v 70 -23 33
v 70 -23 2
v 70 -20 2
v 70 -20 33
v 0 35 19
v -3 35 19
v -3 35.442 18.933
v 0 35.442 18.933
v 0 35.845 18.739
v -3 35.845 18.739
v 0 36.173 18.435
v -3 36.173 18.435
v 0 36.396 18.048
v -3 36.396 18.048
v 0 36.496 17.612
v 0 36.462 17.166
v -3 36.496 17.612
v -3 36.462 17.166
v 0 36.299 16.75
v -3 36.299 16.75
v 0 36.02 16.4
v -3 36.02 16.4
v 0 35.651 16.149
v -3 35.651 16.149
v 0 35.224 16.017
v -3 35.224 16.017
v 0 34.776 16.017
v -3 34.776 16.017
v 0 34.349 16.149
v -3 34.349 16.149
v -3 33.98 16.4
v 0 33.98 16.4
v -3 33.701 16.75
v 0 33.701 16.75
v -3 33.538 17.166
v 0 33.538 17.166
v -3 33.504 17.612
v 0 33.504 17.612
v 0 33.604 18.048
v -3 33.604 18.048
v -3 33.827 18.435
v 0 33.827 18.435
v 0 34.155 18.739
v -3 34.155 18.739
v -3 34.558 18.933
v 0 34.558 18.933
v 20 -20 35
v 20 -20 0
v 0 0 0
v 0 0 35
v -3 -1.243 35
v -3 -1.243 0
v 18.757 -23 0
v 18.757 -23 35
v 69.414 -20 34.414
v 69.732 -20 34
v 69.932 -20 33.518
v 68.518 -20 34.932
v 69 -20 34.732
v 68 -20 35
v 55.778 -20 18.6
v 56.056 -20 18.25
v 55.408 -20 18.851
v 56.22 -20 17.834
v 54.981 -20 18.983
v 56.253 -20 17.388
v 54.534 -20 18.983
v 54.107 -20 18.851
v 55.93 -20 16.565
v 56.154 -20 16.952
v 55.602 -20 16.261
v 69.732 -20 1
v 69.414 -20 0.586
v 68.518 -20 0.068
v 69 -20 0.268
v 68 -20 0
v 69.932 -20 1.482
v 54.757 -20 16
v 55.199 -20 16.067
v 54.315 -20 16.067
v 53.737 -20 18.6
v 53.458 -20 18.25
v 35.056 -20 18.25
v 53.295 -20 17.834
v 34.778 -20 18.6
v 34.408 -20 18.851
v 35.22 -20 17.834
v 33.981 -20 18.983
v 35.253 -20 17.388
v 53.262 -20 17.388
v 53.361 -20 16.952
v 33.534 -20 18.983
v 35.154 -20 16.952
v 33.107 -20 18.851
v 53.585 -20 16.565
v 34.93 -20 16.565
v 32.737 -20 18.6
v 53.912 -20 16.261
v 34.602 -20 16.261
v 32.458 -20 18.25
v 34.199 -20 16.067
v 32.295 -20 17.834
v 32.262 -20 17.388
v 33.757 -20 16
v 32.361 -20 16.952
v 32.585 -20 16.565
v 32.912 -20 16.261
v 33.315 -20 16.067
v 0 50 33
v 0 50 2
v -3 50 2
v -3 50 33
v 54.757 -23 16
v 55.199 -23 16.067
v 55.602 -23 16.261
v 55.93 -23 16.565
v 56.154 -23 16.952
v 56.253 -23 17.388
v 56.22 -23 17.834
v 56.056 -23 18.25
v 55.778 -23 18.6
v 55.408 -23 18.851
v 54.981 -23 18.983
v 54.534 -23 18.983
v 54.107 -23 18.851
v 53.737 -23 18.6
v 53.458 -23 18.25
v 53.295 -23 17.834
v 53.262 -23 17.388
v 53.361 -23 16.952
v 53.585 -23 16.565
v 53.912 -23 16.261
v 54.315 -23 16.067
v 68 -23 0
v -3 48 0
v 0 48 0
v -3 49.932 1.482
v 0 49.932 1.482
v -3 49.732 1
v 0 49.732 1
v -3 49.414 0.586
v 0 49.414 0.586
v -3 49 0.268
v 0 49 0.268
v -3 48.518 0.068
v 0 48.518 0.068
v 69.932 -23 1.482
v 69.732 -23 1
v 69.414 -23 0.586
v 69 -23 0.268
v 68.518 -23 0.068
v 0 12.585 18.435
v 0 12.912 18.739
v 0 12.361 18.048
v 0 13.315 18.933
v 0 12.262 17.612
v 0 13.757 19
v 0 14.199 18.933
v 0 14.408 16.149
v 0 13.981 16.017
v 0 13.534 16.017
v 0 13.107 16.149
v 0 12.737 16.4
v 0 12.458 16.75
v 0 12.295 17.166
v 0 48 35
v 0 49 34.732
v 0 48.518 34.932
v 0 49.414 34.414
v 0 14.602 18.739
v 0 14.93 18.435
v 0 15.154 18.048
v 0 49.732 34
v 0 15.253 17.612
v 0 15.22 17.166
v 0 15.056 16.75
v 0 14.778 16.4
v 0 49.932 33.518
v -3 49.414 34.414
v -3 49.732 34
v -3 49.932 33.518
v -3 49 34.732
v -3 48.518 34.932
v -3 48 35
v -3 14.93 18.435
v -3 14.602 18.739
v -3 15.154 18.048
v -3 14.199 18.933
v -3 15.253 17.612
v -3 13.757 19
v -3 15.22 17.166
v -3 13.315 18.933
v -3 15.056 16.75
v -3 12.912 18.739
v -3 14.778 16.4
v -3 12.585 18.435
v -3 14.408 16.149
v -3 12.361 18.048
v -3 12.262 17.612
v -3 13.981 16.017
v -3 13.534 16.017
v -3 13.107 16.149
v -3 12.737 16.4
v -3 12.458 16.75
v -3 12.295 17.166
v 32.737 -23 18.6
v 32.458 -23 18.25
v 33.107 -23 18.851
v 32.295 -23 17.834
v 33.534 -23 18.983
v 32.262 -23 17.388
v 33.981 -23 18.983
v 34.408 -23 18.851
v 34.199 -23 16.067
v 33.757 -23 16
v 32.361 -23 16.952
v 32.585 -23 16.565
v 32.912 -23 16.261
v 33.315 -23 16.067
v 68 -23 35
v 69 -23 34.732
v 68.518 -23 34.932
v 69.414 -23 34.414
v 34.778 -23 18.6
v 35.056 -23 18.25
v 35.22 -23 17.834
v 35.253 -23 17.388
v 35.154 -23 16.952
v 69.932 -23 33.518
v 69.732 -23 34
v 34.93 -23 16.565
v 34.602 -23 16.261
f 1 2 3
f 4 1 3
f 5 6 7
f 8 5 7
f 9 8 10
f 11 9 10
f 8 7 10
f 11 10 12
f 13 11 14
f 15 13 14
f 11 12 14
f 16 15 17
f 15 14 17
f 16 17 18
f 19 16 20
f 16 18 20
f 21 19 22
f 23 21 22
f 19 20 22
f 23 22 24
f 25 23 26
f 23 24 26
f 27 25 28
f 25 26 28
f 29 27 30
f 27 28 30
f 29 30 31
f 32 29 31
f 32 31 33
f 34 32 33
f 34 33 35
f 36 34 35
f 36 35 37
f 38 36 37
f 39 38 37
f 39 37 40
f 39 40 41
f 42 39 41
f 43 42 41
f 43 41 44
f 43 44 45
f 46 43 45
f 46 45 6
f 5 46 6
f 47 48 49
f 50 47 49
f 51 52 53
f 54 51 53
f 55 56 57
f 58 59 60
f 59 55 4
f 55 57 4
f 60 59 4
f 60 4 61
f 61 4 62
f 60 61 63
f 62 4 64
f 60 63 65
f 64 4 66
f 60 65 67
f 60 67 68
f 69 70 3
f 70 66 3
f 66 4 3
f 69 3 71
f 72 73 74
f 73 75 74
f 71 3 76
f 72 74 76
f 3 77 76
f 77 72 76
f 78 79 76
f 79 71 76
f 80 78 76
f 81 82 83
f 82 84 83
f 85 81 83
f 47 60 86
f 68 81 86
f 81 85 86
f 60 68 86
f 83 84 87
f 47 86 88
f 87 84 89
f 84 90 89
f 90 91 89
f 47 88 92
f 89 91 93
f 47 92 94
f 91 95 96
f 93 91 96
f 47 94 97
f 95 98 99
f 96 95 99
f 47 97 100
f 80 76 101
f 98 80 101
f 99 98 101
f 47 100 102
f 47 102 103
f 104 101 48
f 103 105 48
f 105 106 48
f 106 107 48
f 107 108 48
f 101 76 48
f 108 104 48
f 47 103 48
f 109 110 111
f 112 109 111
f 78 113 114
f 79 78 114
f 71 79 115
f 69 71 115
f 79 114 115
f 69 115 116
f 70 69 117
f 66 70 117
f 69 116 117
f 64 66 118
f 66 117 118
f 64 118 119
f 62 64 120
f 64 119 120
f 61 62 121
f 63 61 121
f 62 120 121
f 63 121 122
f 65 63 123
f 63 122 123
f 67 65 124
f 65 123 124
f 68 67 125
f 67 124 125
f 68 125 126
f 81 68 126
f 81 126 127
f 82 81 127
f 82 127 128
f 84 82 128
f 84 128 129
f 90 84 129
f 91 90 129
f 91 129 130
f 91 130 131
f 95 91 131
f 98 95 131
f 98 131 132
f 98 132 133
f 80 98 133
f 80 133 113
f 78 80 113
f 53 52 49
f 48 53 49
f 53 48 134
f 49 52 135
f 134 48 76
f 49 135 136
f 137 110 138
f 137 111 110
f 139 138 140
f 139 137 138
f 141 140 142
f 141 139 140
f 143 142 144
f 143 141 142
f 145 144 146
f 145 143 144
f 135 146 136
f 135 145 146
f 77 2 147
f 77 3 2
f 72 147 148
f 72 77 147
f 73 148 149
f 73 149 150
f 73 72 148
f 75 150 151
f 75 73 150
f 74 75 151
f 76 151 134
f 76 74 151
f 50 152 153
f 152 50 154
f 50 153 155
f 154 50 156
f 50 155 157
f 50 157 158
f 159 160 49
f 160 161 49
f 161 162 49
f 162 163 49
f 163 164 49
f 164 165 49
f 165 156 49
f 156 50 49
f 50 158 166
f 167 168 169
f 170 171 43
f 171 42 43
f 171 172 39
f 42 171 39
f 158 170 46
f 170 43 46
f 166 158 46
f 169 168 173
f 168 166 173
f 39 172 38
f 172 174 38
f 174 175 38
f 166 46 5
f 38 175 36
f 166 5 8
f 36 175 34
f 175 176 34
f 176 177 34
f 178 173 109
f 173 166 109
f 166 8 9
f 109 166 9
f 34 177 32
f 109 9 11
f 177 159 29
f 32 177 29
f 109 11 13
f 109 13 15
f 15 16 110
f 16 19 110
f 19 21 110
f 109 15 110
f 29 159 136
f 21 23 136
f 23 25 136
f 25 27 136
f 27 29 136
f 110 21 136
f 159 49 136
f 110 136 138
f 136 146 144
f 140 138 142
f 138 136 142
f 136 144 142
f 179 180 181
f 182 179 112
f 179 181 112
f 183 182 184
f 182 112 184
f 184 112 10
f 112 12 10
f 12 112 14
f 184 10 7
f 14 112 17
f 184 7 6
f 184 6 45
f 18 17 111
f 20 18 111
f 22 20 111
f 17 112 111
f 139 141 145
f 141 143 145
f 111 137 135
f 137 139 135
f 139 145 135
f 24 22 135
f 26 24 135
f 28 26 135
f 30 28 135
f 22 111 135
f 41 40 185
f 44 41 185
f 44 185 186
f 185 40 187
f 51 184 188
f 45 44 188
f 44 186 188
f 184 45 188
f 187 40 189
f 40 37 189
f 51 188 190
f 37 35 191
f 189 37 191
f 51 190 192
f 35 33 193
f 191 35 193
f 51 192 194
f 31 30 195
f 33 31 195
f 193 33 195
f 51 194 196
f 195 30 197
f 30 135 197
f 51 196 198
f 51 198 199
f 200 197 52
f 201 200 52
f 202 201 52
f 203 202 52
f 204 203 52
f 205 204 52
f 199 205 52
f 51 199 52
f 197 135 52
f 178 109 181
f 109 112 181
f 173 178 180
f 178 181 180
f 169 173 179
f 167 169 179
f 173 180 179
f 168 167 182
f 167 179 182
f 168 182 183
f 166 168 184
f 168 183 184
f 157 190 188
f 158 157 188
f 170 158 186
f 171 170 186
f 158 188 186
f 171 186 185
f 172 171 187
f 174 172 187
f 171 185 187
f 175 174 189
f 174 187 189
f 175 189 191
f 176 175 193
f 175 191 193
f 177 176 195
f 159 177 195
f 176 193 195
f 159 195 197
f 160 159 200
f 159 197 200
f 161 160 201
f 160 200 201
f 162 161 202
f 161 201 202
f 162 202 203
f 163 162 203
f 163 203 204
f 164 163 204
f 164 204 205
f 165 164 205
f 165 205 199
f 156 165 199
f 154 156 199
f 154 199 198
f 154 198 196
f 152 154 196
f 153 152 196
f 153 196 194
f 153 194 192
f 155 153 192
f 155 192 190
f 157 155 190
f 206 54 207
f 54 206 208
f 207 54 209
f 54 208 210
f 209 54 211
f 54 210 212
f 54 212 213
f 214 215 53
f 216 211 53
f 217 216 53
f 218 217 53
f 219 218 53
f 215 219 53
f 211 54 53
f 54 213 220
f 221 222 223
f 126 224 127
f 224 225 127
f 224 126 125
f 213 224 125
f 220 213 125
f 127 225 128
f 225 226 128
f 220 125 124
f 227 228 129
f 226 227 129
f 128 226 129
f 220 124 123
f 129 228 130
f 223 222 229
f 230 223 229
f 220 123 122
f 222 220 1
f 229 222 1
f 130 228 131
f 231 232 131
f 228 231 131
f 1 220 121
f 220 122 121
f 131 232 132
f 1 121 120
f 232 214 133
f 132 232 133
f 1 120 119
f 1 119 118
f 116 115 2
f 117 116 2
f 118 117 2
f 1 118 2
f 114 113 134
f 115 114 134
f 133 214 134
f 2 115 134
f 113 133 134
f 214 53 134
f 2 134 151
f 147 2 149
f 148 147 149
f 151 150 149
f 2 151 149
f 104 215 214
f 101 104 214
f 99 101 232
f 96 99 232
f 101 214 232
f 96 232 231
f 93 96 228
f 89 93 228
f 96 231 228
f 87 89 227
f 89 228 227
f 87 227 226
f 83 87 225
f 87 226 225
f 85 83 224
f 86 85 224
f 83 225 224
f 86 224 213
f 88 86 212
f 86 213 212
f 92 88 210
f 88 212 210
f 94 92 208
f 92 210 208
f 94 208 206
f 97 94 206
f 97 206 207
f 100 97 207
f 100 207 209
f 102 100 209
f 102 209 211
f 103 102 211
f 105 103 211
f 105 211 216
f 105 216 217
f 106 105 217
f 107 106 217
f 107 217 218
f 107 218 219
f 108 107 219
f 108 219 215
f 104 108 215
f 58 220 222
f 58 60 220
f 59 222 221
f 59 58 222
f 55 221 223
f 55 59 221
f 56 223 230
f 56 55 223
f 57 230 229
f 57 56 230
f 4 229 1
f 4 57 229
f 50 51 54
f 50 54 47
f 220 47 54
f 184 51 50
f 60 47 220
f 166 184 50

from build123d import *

# Parameters (mm, degrees)
EXTRU_MINCE1_DEPTH      = 35
CONG_3_R                = 2
CONG_4_R                = 2
CONG_5_R                = 2
CONG_6_R                = 2
ESQUISSE2_R             = 1.5
ENL_V_MAT_EXTRU_1_DEPTH = 10
ESQUISSE3_R             = 1.5
ENL_V_MAT_EXTRU_2_DEPTH = 10


with BuildPart() as part:
    # Esquisse1 → Extru.-Mince1 (new body)
    with BuildSketch(Plane.XY):
        Polygon((70, -20), (20, -20), (0, 0), (0, 50), (-3, 50), (-3, -1.242640687), (18.757359313, -23), (70, -23), align=None)
    extrude(amount=EXTRU_MINCE1_DEPTH)

    # Congé3
    cong_3_edges = [part.edges().sort_by_distance(p)[0] for p in [
        (-1.5, 50, 35),
    ]]
    fillet(cong_3_edges, radius=CONG_3_R)

    # Congé4
    cong_4_edges = [part.edges().sort_by_distance(p)[0] for p in [
        (-1.5, 50, 0),
    ]]
    fillet(cong_4_edges, radius=CONG_4_R)

    # Congé5
    cong_5_edges = [part.edges().sort_by_distance(p)[0] for p in [
        (70, -21.5, 35),
    ]]
    fillet(cong_5_edges, radius=CONG_5_R)

    # Congé6
    cong_6_edges = [part.edges().sort_by_distance(p)[0] for p in [
        (70, -21.5, 0),
    ]]
    fillet(cong_6_edges, radius=CONG_6_R)

    # Esquisse2 → Enlèv. mat.-Extru.1 (cut)
    with BuildSketch(Plane.XZ.offset(23)):
        with Locations(Location((33.757359313, 17.5, 0), (0, 0, 270))):
            Circle(ESQUISSE2_R)
        with Locations(Location((54.757359313, 17.5, 0), (0, 0, 270))):
            Circle(ESQUISSE2_R)
    extrude(amount=-ENL_V_MAT_EXTRU_1_DEPTH, mode=Mode.SUBTRACT)

    # Esquisse3 → Enlèv. mat.-Extru.2 (cut)
    with BuildSketch(Plane.ZY.offset(3)):
        with Locations((17.5, 35)):
            Circle(ESQUISSE3_R)
        with Locations((17.5, 13.757359313)):
            Circle(ESQUISSE3_R)
    extrude(amount=-ENL_V_MAT_EXTRU_2_DEPTH, mode=Mode.SUBTRACT)


solid = part.part
